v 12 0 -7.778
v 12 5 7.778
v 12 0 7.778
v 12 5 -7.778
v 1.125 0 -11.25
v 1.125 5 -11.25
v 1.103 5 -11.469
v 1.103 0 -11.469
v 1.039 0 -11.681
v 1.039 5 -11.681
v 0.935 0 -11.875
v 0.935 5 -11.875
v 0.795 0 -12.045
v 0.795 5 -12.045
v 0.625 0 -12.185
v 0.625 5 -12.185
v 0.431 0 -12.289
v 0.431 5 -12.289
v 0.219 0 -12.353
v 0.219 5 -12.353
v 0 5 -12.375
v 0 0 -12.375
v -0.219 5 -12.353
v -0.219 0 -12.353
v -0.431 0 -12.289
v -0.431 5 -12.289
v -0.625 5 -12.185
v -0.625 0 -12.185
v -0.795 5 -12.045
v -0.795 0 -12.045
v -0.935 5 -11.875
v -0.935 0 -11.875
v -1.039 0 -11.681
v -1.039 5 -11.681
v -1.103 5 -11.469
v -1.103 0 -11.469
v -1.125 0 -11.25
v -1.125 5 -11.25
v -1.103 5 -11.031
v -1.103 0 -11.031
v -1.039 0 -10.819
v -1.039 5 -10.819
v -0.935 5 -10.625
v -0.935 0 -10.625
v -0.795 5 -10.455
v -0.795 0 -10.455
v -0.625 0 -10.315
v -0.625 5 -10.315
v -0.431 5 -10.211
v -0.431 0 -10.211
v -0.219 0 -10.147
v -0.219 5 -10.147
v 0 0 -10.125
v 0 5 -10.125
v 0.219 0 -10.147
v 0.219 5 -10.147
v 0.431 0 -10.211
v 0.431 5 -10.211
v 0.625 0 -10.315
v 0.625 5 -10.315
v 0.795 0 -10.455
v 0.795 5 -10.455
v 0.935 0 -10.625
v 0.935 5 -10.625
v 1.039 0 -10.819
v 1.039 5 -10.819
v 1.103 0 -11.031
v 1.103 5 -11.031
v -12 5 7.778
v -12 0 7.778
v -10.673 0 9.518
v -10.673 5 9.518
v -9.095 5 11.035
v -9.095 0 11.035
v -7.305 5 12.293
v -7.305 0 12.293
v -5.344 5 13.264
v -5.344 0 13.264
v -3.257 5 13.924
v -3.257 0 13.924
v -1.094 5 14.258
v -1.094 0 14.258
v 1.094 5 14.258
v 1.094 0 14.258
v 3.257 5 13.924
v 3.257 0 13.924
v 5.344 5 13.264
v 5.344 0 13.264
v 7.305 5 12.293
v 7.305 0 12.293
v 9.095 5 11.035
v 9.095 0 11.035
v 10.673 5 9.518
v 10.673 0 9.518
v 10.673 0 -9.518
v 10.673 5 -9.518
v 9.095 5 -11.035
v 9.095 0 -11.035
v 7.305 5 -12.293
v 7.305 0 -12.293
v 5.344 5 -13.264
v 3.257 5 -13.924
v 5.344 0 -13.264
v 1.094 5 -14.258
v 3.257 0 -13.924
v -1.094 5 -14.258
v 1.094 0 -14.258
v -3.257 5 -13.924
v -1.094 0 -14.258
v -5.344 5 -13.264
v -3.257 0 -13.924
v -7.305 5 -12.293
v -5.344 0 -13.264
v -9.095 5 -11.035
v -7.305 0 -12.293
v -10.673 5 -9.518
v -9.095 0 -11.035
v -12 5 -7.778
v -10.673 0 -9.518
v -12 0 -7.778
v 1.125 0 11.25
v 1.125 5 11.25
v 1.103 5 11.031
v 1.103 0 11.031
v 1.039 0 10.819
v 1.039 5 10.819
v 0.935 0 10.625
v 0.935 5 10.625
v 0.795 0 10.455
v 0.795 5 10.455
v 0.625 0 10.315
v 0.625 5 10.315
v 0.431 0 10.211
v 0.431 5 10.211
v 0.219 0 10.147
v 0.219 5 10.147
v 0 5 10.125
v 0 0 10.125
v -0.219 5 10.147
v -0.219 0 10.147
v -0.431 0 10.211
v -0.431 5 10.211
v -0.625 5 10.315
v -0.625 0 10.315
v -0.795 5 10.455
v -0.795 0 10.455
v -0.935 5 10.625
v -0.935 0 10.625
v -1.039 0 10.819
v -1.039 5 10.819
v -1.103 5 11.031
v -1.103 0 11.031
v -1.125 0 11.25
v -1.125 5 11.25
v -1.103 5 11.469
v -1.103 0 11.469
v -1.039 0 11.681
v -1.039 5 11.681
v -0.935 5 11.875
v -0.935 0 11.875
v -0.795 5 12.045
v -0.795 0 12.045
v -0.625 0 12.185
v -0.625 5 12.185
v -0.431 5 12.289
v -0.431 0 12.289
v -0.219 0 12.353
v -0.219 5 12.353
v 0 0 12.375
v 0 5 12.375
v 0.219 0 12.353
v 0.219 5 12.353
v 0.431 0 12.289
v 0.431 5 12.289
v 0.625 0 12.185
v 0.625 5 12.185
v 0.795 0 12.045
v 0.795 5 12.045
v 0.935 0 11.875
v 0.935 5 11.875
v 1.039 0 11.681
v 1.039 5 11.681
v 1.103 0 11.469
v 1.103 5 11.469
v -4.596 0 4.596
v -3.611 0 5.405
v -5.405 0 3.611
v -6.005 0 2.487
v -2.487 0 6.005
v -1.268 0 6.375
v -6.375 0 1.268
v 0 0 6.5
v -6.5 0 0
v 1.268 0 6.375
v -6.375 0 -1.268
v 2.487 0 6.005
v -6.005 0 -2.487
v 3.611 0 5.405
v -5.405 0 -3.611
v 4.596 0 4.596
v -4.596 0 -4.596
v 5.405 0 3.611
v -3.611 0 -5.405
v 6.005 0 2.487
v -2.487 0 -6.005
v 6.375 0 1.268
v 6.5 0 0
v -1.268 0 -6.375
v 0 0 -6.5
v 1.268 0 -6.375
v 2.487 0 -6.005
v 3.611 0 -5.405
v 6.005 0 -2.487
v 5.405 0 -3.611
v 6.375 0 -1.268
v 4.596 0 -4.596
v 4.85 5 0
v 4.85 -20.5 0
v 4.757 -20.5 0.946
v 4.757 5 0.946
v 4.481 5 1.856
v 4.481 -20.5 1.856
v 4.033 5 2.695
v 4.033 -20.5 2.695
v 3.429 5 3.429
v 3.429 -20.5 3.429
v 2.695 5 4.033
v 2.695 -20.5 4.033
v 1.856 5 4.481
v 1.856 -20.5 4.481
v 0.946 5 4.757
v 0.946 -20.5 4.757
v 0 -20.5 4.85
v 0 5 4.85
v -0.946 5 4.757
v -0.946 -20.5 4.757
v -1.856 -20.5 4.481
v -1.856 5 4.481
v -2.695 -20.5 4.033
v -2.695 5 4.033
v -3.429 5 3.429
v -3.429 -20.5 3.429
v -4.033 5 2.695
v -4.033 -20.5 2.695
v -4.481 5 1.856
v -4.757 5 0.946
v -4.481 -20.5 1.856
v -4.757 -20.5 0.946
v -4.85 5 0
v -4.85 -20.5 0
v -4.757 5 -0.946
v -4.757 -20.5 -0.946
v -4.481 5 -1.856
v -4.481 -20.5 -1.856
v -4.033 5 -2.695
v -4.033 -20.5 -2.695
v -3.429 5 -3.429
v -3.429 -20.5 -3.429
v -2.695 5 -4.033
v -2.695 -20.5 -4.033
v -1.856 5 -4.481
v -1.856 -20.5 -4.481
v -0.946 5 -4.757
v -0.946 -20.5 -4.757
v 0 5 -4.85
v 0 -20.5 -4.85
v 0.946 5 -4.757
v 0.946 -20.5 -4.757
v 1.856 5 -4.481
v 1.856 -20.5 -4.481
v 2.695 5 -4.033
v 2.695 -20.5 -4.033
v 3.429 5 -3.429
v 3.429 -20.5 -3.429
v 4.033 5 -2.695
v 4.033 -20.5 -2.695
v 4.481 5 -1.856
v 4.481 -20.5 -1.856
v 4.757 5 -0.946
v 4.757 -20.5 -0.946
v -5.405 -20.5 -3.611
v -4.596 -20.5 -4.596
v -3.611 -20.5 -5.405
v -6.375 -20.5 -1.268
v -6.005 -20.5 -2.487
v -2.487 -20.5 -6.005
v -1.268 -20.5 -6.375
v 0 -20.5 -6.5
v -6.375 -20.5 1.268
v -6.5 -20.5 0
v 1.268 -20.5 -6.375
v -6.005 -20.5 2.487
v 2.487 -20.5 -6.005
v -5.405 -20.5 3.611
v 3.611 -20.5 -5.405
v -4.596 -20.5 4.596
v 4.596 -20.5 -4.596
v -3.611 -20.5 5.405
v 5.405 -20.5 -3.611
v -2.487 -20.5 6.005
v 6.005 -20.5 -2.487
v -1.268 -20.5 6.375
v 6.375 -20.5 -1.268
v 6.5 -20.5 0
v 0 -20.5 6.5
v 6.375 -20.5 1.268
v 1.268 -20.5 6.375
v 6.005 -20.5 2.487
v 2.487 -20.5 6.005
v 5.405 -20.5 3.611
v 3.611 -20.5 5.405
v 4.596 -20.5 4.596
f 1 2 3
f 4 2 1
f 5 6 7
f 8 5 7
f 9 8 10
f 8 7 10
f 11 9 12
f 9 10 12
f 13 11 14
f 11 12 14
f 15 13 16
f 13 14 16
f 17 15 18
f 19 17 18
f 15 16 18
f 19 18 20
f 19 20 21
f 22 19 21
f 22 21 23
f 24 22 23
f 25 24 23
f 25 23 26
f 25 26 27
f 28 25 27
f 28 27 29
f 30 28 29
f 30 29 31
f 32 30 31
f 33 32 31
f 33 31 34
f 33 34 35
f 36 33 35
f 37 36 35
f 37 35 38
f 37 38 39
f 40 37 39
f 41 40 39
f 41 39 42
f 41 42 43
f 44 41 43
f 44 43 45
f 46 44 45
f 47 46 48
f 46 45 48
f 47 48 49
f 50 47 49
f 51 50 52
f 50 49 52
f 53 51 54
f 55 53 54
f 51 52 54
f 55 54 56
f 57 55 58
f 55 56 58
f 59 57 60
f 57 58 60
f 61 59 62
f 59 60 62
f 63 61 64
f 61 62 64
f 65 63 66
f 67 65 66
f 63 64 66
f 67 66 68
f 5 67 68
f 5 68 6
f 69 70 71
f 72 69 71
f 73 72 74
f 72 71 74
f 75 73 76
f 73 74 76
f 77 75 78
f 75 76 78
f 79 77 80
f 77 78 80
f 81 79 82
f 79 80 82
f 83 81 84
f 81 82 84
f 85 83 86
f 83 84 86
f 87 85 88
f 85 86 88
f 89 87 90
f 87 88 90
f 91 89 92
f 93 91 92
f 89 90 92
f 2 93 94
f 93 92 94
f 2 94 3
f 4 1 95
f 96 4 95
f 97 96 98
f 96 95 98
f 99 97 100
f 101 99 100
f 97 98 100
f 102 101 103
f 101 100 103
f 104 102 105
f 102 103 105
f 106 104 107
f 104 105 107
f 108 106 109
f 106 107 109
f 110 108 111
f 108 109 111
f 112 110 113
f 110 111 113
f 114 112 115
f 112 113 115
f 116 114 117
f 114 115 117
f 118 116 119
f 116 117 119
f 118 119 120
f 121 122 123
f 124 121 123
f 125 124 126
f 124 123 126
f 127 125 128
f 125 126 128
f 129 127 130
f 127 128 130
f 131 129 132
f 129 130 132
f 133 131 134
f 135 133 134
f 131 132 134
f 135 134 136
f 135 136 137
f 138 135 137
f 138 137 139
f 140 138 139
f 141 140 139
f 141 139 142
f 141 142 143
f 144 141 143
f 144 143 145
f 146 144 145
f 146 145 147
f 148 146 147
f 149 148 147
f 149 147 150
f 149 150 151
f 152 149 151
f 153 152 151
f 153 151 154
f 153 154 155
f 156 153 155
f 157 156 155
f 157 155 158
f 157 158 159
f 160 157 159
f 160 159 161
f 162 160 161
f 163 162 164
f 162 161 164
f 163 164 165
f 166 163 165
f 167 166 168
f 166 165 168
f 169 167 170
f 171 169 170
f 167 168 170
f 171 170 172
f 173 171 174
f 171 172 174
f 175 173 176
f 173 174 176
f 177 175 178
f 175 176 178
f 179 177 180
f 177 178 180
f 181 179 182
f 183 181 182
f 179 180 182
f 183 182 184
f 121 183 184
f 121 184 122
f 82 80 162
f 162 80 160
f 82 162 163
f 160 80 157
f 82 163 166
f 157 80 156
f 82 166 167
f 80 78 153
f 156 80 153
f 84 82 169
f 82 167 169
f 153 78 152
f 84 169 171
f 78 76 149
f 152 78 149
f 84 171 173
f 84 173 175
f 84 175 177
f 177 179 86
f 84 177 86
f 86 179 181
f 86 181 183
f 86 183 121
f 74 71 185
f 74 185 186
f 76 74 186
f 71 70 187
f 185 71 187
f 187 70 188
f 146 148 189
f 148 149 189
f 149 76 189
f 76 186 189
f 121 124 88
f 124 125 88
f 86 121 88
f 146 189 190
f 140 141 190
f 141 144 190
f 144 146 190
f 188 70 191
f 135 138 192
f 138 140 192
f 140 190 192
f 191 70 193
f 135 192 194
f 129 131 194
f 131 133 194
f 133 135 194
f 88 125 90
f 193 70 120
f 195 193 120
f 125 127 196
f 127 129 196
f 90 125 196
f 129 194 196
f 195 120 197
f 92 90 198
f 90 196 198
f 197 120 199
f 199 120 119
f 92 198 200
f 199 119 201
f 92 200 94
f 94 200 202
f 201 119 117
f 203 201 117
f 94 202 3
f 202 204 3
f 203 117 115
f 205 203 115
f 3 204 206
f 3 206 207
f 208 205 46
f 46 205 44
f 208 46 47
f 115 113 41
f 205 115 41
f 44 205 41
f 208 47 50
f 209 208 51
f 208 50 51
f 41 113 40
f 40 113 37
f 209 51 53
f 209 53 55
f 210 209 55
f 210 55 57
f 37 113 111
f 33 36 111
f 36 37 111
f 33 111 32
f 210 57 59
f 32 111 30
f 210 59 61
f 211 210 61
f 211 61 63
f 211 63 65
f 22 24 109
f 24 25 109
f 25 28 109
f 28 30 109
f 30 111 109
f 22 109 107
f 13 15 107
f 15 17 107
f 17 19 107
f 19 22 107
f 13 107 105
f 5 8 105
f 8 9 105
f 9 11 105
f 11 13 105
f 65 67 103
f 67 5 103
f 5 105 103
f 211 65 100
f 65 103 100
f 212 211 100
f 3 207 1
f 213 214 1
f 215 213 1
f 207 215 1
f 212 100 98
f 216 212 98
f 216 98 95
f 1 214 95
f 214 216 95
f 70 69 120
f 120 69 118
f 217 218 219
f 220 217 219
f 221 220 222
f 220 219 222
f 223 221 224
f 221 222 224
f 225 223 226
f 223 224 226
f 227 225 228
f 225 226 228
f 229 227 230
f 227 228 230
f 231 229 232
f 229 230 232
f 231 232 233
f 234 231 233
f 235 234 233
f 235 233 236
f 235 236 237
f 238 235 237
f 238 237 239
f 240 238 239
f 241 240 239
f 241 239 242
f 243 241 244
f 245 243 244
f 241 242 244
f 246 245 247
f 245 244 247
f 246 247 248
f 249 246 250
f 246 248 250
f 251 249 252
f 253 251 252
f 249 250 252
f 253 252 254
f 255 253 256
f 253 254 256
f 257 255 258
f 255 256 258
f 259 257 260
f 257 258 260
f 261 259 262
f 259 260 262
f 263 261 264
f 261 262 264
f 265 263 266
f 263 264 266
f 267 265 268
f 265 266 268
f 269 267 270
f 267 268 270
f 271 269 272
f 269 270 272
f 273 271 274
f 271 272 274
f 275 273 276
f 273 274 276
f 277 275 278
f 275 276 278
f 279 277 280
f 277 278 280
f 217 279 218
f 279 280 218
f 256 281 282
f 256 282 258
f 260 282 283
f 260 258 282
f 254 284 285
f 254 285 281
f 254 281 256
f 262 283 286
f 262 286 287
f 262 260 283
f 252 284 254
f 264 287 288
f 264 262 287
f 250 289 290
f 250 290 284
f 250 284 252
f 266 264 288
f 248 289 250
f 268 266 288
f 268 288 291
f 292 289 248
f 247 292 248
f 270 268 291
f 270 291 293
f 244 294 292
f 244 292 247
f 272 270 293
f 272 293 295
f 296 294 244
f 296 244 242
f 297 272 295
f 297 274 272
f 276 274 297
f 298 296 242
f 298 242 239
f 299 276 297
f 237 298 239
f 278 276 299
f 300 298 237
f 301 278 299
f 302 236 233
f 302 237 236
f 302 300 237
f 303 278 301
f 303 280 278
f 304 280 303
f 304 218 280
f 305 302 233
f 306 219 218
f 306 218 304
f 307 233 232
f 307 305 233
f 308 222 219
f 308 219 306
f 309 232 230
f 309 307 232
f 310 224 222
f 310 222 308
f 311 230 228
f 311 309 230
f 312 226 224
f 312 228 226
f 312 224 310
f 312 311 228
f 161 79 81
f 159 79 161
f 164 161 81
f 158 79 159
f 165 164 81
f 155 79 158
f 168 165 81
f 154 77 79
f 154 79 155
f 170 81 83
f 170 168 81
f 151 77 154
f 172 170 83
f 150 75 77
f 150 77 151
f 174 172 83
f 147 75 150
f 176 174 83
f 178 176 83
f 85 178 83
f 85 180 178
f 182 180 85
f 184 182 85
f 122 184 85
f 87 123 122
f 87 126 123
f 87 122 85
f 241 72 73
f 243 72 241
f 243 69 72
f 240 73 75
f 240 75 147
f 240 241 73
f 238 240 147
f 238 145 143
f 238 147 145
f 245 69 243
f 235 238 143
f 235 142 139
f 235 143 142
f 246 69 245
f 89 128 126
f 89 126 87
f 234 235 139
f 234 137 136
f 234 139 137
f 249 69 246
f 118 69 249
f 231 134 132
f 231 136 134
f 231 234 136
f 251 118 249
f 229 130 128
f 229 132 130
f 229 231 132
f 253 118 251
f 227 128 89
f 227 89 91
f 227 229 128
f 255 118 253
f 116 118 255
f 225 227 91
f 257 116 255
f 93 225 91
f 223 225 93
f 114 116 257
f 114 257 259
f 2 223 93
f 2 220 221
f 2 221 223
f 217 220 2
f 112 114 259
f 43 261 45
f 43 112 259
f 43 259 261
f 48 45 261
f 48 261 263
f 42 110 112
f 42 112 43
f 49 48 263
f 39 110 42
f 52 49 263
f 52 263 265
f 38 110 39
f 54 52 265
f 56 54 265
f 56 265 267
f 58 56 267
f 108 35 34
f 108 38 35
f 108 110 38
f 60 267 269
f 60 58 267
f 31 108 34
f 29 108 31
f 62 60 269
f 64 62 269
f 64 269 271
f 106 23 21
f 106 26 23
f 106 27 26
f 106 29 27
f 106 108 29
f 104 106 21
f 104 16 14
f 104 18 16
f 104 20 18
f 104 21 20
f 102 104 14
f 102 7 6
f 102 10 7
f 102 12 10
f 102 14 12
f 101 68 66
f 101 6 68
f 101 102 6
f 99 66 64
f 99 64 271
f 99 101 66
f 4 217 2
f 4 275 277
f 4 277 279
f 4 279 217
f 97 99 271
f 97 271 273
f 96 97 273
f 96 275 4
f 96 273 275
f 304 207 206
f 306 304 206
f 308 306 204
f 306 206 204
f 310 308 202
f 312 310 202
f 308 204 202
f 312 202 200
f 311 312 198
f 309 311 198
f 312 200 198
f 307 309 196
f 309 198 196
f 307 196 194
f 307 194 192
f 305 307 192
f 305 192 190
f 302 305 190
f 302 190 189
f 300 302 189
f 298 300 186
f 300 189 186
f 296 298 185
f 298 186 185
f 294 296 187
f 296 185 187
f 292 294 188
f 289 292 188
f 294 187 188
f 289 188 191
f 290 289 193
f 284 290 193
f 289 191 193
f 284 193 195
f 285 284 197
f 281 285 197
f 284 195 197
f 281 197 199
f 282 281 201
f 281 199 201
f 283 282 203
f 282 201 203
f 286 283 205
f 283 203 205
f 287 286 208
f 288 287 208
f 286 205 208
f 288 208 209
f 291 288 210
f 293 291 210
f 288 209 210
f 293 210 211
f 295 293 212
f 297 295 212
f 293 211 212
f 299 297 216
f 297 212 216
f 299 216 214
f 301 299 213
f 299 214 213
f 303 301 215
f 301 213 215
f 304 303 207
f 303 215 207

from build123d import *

# Parameters (mm, degrees)
SKETCH1_R           = 14.3
BOSS_EXTRUDE1_DEPTH = 5
SKETCH2_R           = 6.5
BOSS_EXTRUDE2_DEPTH = 20.5
SKETCH5_R           = 1.125
CUT_EXTRUDE1_DEPTH  = 15
SKETCH6_R           = 4.85
CUT_EXTRUDE2_DEPTH  = 25.5
SKETCH7_W           = 3.263473237
SKETCH7_H           = 32.347337023
SKETCH7_W_2         = 3.52826165
CUT_EXTRUDE5_DEPTH  = 10


with BuildPart() as part:
    # Sketch1 → Boss-Extrude1 (new body)
    with BuildSketch(Plane(origin=(0, 0, 0), x_dir=(1, 0, 0), z_dir=(0, 1, 0))):
        Circle(SKETCH1_R)
    extrude(amount=BOSS_EXTRUDE1_DEPTH)

    # Sketch2 → Boss-Extrude2 (add)
    with BuildSketch(Plane.XZ):
        Circle(SKETCH2_R)
    extrude(amount=BOSS_EXTRUDE2_DEPTH)

    # Sketch5 → Cut-Extrude1 (cut)
    with BuildSketch(Plane(origin=(0, 5, 0), x_dir=(1, 0, 0), z_dir=(0, 1, 0))):
        with Locations((0, -11.25)):
            Circle(SKETCH5_R)
        with Locations((0, 11.25)):
            Circle(SKETCH5_R)
    extrude(amount=-CUT_EXTRUDE1_DEPTH, mode=Mode.SUBTRACT)

    # Sketch6 → Cut-Extrude2 (cut)
    with BuildSketch(Plane.XZ.offset(20.5)):
        Circle(SKETCH6_R)
    extrude(amount=-CUT_EXTRUDE2_DEPTH, mode=Mode.SUBTRACT)

    # Sketch7 → Cut-Extrude5 (cut)
    with BuildSketch(Plane(origin=(0, 5, 0), x_dir=(1, 0, 0), z_dir=(0, 1, 0))):
        with Locations((13.631736618, 0.768402462)):
            Rectangle(SKETCH7_W, SKETCH7_H)
        with Locations((-13.764130825, 0.768402462)):
            Rectangle(SKETCH7_W_2, SKETCH7_H)
    extrude(amount=-CUT_EXTRUDE5_DEPTH, mode=Mode.SUBTRACT)


solid = part.part
